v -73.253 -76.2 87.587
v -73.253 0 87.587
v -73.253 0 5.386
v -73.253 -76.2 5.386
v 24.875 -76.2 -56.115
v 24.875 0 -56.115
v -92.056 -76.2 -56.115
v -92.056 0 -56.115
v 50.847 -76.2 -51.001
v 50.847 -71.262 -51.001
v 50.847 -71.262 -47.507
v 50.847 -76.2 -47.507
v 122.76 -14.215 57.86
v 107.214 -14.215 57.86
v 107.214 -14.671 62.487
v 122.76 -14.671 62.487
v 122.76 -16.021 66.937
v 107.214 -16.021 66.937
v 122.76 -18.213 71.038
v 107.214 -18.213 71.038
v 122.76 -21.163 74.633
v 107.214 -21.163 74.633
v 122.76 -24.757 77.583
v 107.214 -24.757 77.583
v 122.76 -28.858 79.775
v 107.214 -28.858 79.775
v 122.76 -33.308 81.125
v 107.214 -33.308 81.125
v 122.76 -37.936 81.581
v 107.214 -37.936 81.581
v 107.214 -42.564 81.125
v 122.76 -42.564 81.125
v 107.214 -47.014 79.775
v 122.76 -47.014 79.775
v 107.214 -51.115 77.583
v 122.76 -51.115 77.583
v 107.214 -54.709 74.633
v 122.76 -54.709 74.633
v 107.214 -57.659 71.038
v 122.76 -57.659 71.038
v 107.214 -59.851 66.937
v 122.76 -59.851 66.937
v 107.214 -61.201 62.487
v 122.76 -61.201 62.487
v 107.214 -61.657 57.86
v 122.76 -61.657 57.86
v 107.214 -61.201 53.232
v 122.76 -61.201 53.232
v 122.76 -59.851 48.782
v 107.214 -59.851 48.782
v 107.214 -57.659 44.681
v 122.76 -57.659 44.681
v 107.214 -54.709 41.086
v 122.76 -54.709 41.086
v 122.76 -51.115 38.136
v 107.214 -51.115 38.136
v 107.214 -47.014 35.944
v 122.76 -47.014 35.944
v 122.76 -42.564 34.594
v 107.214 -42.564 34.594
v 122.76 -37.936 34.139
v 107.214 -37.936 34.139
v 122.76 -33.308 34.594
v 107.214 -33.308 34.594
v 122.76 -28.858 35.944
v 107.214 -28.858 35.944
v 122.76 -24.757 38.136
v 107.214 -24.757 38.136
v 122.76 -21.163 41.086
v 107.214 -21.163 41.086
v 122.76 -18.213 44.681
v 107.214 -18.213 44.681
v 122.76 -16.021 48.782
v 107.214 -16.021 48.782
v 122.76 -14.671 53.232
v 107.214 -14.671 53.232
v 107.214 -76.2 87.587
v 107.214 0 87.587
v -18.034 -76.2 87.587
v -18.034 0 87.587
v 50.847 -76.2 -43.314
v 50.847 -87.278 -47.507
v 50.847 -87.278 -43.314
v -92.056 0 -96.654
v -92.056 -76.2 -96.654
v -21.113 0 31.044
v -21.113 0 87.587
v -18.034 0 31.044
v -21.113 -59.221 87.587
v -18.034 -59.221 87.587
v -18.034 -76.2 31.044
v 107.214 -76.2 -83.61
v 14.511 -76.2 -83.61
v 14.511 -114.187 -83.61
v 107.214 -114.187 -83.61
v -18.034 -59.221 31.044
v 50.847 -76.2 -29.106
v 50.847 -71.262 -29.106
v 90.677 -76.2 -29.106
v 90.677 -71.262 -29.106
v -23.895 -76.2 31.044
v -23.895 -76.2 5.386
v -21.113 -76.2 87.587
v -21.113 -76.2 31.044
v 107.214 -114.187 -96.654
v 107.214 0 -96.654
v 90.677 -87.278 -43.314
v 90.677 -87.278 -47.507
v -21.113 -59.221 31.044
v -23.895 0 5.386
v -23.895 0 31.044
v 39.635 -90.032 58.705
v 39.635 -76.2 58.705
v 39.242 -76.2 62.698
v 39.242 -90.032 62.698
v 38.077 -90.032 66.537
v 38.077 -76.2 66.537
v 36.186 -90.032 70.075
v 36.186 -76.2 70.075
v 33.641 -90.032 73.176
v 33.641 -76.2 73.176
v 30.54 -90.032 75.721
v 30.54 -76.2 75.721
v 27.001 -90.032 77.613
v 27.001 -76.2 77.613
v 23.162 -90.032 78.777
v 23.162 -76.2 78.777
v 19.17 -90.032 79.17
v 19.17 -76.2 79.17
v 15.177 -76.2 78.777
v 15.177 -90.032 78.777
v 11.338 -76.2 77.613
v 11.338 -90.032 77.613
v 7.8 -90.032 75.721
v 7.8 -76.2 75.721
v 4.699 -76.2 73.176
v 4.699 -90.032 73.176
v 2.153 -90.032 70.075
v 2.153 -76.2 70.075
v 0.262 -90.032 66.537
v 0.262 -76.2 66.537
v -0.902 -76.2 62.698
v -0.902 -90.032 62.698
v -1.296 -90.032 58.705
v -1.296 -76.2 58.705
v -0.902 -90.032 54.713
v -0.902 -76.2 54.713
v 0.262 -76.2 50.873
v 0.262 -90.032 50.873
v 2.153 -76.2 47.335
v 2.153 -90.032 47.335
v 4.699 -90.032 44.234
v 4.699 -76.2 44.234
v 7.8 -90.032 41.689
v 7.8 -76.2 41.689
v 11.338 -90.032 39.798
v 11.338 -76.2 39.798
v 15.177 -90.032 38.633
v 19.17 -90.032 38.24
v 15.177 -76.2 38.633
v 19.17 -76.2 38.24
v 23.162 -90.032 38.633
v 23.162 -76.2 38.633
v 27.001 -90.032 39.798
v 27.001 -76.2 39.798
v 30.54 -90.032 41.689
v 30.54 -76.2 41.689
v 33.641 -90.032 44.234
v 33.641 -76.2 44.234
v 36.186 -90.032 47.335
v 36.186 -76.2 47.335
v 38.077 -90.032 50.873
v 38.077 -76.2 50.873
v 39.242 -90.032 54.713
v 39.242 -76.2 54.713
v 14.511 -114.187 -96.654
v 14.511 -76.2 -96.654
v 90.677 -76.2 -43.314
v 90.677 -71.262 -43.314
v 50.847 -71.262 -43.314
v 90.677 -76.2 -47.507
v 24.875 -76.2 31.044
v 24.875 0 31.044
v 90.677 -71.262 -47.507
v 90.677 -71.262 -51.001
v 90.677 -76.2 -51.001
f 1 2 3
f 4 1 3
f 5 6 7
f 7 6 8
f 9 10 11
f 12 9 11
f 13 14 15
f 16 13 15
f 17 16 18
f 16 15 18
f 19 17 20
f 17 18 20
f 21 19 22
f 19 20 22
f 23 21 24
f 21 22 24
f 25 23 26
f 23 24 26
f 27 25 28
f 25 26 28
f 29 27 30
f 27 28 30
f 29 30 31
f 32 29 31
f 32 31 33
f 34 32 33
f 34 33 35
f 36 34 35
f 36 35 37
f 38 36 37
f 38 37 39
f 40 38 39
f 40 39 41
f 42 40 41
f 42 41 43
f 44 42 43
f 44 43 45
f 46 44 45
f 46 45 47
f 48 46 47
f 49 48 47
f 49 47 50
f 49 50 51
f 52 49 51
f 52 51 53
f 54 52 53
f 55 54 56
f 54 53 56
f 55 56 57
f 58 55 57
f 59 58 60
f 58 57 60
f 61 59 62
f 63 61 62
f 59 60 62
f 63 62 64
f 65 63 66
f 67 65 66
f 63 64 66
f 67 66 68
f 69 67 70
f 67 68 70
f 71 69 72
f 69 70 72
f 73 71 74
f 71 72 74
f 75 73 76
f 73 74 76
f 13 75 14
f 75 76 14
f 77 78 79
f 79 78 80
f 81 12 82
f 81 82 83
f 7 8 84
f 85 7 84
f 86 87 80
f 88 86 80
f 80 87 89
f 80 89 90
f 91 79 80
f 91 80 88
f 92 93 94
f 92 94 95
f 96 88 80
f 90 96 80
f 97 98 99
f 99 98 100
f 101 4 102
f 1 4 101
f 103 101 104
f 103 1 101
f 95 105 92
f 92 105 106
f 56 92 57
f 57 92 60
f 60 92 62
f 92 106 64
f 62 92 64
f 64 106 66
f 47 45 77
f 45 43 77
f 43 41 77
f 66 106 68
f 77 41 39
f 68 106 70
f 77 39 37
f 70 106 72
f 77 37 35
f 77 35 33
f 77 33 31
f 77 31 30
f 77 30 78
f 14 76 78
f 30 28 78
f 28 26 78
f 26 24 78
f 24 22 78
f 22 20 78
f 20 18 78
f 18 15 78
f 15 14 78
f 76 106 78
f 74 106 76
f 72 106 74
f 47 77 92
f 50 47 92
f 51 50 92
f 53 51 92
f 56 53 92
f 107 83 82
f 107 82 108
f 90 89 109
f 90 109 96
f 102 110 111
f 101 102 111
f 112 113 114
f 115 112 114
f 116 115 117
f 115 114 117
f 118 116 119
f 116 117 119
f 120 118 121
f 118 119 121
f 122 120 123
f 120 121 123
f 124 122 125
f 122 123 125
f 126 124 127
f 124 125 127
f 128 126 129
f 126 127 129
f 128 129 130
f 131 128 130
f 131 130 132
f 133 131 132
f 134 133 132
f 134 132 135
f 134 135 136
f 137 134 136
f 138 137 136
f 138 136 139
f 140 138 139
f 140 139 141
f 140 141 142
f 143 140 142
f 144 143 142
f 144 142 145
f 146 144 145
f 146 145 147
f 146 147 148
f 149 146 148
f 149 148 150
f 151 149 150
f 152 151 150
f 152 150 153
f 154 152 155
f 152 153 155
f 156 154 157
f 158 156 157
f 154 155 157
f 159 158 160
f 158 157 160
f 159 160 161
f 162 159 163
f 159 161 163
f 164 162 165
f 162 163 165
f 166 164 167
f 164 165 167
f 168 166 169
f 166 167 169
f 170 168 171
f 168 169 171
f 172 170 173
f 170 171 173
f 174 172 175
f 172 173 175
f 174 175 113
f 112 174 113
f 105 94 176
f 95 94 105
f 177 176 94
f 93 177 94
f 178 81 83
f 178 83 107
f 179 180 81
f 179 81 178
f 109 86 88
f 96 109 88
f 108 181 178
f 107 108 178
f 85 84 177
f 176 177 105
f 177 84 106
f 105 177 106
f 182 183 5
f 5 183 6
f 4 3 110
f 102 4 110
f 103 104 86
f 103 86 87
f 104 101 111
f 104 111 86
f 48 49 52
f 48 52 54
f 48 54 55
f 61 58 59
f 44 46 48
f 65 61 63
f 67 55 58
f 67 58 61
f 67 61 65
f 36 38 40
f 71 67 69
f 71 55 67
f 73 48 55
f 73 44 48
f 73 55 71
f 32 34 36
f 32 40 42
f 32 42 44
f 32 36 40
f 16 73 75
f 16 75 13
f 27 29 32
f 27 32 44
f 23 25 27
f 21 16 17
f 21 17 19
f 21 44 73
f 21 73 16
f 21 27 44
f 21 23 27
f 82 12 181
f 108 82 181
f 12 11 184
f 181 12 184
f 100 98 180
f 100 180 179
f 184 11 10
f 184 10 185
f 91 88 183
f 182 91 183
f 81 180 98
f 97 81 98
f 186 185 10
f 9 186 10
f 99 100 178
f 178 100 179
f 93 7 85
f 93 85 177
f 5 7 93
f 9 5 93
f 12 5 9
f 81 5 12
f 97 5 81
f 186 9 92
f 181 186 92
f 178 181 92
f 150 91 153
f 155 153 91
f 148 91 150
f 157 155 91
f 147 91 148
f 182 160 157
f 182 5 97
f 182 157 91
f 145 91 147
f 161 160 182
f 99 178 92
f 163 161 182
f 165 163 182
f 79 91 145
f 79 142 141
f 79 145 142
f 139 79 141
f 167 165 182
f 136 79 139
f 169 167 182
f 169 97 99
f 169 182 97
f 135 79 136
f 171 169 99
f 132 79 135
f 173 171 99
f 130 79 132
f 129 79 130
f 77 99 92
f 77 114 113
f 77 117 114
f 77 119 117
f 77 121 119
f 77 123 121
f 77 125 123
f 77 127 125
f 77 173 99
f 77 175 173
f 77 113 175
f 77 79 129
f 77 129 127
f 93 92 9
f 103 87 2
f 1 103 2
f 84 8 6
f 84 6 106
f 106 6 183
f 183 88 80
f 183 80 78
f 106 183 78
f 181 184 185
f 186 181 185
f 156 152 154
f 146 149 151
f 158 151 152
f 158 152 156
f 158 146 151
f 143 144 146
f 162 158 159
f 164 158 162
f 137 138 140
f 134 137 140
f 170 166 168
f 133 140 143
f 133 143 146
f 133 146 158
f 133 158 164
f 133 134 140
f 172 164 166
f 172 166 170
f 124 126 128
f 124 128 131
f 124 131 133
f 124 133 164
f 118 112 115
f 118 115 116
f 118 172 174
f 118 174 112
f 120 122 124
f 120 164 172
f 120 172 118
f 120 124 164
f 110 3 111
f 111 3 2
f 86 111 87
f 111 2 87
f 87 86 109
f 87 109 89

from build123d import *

# Parameters (mm, degrees)
F2_DEPTH = 76.2
F0_R     = 20.4653135308
F3_DEPTH = 90.03188
F0_W     = 39.8295894265
F0_H     = 14.2082143575
F0_H_2   = 3.4938193858
F4_DEPTH = 71.26206
F0_H_3   = 4.1925944388
F5_DEPTH = 87.27823
F0_W_2   = 92.7027892321
F0_H_4   = 13.0436122417
F6_DEPTH = 114.18662
F0_W_3   = 3.078199923
F0_H_5   = 56.5431583673
F7_DEPTH = 59.22076
F1_R     = 23.7210403161
F8_DEPTH = 122.76001


with BuildPart() as f2:
    # F0 (on Front) → F2 (new body)
    with BuildSketch(Plane.XZ):
        Polygon((-73.2527300715, 87.5874310732), (-73.2527300715, 5.3862300701), (-23.8952767104, 5.3862300701), (-23.8952767104, 31.0442727059), (-21.1126040667, 31.0442727059), (-21.1126040667, 87.5874310732), align=None)
    extrude(amount=F2_DEPTH)


with BuildPart() as f2b:
    # F0 (on Front) → F2, piece 2 (new body)
    with BuildSketch(Plane.XZ):
        Polygon((107.2141155601, 87.5874310732), (-18.0344041437, 87.5874310732), (-18.0344041437, 31.0442727059), (24.8745921999, 31.0442727059), (24.8745921999, -56.1147257686), (-92.0555666089, -56.1147257686), (-92.0555666089, -96.6535285115), (14.5113263279, -96.6535285115), (14.5113263279, -83.6099162698), (107.2141155601, -83.6099162698), align=None)
        Polygon((90.6766802073, -51.0009080172), (50.8470907807, -51.0009080172), (50.8470907807, -47.5070886314), (50.8470907807, -43.3144941926), (50.8470907807, -29.1062798351), (90.6766802073, -29.1062798351), (90.6766802073, -43.3144941926), (90.6766802073, -47.5070886314), align=None, mode=Mode.SUBTRACT)
        with Locations((19.1697571427, 58.7051510811)):
            Circle(F0_R, mode=Mode.SUBTRACT)
    extrude(amount=F2_DEPTH)

    # F0 (on Front) → F3 (join)
    with BuildSketch(Plane.XZ):
        with Locations((19.1697571427, 58.7051510811)):
            Circle(F0_R)
    extrude(amount=F3_DEPTH)

    # F0 (on Front) → F4 (join)
    with BuildSketch(Plane.XZ):
        with Locations((70.761885494, -36.2103870139)):
            Rectangle(F0_W, F0_H)
        with Locations((70.761885494, -49.2539983243)):
            Rectangle(F0_W, F0_H_2)
    extrude(amount=F4_DEPTH)

    # F0 (on Front) → F5 (join)
    with BuildSketch(Plane.XZ):
        with Locations((70.761885494, -45.410791412)):
            Rectangle(F0_W, F0_H_3)
    extrude(amount=F5_DEPTH)

    # F0 (on Front) → F6 (join)
    with BuildSketch(Plane.XZ):
        with Locations((60.862720944, -90.1317223907)):
            Rectangle(F0_W_2, F0_H_4)
    extrude(amount=F6_DEPTH)

    # F1 (on Right) → F8 (join)
    with BuildSketch(Plane.YZ):
        with Locations((-37.9360765219, 57.8596889973)):
            Circle(F1_R)
    extrude(amount=F8_DEPTH)


with BuildPart() as f7:
    # F0 (on Front) → F7 (new body)
    with BuildSketch(Plane.XZ):
        with Locations((-19.5735041052, 59.3158518896)):
            Rectangle(F0_W_3, F0_H_5)
    extrude(amount=F7_DEPTH)


solid = Compound([f2.part, f2b.part, f7.part])
